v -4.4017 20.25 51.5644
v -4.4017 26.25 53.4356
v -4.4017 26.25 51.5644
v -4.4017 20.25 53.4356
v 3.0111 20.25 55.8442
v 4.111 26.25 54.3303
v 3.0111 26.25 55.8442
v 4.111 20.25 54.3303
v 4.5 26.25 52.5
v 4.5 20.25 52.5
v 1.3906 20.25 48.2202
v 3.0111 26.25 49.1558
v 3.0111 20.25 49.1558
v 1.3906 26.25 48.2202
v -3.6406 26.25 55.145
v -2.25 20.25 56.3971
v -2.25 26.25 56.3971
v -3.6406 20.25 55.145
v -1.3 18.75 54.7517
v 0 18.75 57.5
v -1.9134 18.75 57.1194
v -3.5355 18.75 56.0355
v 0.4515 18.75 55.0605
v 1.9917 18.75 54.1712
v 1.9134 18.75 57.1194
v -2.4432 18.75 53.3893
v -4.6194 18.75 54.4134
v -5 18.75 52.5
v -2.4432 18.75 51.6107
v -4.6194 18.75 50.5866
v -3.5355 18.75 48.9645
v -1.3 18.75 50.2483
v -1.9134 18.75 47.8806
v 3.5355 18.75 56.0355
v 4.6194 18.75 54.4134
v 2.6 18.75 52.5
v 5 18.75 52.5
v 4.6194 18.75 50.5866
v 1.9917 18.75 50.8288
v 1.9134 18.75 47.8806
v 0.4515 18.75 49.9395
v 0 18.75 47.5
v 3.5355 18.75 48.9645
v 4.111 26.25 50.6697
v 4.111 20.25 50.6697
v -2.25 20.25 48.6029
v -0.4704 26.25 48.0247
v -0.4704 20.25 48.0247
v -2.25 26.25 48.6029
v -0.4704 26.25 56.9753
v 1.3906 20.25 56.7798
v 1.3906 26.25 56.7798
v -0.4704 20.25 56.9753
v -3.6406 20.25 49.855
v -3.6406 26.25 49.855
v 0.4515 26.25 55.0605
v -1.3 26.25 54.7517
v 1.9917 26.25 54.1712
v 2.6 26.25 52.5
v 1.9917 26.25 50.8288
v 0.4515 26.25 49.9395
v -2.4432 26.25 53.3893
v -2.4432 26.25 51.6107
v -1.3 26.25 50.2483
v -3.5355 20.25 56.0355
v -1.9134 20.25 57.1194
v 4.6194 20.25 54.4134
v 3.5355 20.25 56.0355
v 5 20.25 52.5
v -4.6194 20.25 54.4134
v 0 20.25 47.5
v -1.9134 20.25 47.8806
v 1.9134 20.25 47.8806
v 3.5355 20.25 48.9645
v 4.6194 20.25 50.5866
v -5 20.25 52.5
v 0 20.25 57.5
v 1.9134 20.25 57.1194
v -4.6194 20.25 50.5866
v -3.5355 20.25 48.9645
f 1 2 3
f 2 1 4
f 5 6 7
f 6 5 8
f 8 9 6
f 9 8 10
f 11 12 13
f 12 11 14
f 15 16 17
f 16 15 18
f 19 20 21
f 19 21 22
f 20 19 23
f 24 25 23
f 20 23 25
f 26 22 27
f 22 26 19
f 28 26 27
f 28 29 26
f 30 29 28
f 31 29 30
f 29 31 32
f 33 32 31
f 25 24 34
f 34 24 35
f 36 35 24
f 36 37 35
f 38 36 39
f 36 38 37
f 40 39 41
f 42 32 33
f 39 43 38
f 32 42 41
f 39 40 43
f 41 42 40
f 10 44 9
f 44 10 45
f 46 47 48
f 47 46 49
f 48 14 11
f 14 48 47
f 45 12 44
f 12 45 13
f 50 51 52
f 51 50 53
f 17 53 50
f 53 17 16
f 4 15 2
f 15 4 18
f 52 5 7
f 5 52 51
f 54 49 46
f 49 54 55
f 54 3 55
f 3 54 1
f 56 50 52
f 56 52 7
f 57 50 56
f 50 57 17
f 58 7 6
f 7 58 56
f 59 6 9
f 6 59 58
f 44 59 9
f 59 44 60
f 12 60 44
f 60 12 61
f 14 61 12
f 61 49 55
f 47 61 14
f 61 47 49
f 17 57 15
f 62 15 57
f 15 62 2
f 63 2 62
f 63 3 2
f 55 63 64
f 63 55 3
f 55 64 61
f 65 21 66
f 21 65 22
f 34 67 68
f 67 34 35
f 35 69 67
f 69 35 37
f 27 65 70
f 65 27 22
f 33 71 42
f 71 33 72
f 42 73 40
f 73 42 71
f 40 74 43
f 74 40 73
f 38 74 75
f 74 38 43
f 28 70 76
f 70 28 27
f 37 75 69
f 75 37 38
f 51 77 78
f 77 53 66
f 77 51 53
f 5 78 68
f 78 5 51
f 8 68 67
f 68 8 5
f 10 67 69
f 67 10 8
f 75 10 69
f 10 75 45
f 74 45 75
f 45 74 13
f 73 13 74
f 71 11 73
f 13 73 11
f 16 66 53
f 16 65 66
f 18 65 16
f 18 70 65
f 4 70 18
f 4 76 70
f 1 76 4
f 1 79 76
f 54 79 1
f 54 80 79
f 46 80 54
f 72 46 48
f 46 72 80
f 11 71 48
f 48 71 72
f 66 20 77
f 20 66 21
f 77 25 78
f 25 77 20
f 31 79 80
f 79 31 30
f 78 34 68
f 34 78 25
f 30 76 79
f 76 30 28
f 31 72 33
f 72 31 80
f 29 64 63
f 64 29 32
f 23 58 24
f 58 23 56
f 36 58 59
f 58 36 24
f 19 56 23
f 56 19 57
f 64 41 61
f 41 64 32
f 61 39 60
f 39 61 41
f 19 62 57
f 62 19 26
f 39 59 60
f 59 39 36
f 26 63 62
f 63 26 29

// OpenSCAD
// file: Addons_v1.scad
include <Defines_v1.scad>;

module Folie() {
    translate([45, - height / 2 - 3, depth - 50])
        rotate([90,-90,0])
            cube([80,70,1.5], center = true);
}

module Board() {
    translate([52.5, height / 2 - 5, depth / 2 - 5])
    rotate([90,0,0])
    difference() {
        union() {
            cube([63, 52, 1.6], center = true);
            cube([80, 34, 1.6], center = true);
            cube([73, 44, 1.6], center = true);
            
            translate([-35.56, -8.89, 3])
                cube([2.54, 10.16, 10], center = true);
            
            translate([-7.7, -23.24, 3])
                cube([17.78, 2.54, 10], center = true);
            
            translate([12.78, -23.24, 3])
                cube([7.62, 2.54, 10], center = true);
            
            translate([21.59, -12.7, 7])
                cube([20.32, 2.54, 18], center = true);
            translate([21.59, 15.24, 7])
                cube([20.32, 2.54, 18], center = true);            
            translate([24.13, 1.27, 14])
                cube([27.94, 31.75, 1.6], center = true);
            
        }
        
        for (i = [-1: 2: 1]) for (j = [-1: 2: 1])
        {
            translate([i*21, j*21, 0])
                cylinder(2, 1.75, 1.75, $fn=16, center = true);
            translate([i*36.5, j*22, 0])
                cylinder(2, 5, 5, $fn=16, center = true);
        }
        
        cols = [9, 9, 9, 9, 9, 9, 9, 9, 7, 7, 7, 7, 7, 6, 5];
        for (row = [-14 : 1 : 14])
        { 
            for (col = [-cols[abs(row)], -cols[abs(row)] + 1,
                        cols[abs(row)] - 1, cols[abs(row)]]) 
            {
                translate([2.54 * row, 2.54 * col, 0])
                    cube([0.8, 0.8, 2], center = true);
            }
        }
    }
}

Board();

module BatPack() {
    translate([-55, height / 2 - 11, depth / 2])
    rotate([0,0,90]) {
        translate([0, 0, 0]) 
            cylinder(65, 9, 9, center = true);
        translate([0, 19, 0]) 
            cylinder(65, 9, 9, center = true);
        translate([0, 38, 0]) 
            cylinder(65, 9, 9, center = true);
        translate([0, -19, 0]) 
            cylinder(65, 9, 9, center = true);
        translate([0, -38, 0]) 
            cylinder(65, 9, 9, center = true);
    }
}

module Lader() {
    translate([-30, 7 - height / 2 , depth/2 + 20])
    rotate([-90, 0, 0])
    union() {
        translate([0, 0, 0]) 
            cube([77, 19, 11], center = true);
        translate([32, 18, 0]) 
            cube([13, 55, 11], center = true);
        translate([0, 5, -2]) 
            cube([19, 8, 11], center = true);
    }
}

module OLED() {
    translate([-40, 1 - height / 2 , depth/2 - 5])
    rotate([90,0,0])
    union() {
        translate([0, 0, 1]) 
            cube([26, 11, 3.5], center = true);
        translate([0, -1, 0]) 
            cube([39, 13, 1.5], center = true);
        translate([17, -1, -3]) 
            cube([3, 11, 12], center = true);
    }
}
    
module CamMount() {
    translate([0, height / 2 - 1, depth / 2])
    rotate([90,0,0]) difference() {
        union() {
            translate([0, 0, 0]) 
                cylinder(7.5, 4.5, 4.5, center = true);
            translate([0, 0, 3]) 
                cylinder(1.5, 5, 5, center = true);
        }
        translate([0, 0, 0]) 
            cylinder(8, 2.6, 2.6, center = true);
    }
}

Board();
// file: Fuss_v1.scad
include <Defines_v1.scad>;

module Fuss() {
    difference() {
        translate([0,0,5.5]) minkowski() {
            difference() {
                cylinder(10, 8, 8, $fn = grade, center = true);
                translate([0,0,5])
                    cylinder(5, 7.5, 7.5, $fn = grade, center = true);
            }
            sphere(2, $fn=8);
        }
        translate([0,0,-1.5]) 
            cube([20,20,3], center = true);
        translate([0, 0, 5]) 
            cylinder(10.1, 1, 1, $fn = 16, center = true);
        translate([0, 0, 9.5]) 
            cylinder(1, 1, 3, $fn = 16, center = true);
    }
}

translate([-20,-20,0]) Fuss();
translate([20,-20,0]) Fuss();
translate([-20,20,0]) Fuss();
translate([20,20,0]) Fuss();
// file: Stativ_v1.scad
include <Defines_v1.scad>;

module Stativ() {
    difference() {
        union() {
            hull() {
                translate([0, stand, 0]) cylinder(5, 5, 5, $fn=48);
                cylinder(5, 10, 10, $fn=48);
            }
            cylinder(20, 8, 8, $fn=48);
        }
        translate([0, -10, 15.1]) cube([20, 20, 5]);
        translate([-3.5, 0, 15.1]) 
            cylinder(10.1, 1, 1, $fn=16, center = true);
    }
}

module Scheibe() {
    difference() {
        cylinder(5, 10, 10, $fn=48);
        translate([-3.5, 0, 0.1]) 
            cylinder(10.1, 1, 1, $fn=16, center = true);
        translate([-3.5, 0, 4]) 
            cylinder(2.1, 1, 3, $fn=16, center = true);        
    }
}

Stativ();
translate([30,0,0]) Scheibe();
// file: Decke_v1.scad
include <Defines_v1.scad>;

bwidth = width + 14;
bheight = depth + 7;

module hole() {
    union() {
        translate([0, 0, 3.5]) cylinder(7.1, 1, 1, $fn=16, center = true);
        translate([0, 0, 0.7]) cylinder(1.5, 4, 1, $fn=16, center = true);
    }
}

module Decke() {
    difference() {
        union() {
            translate([bwidth / 2, bheight / 2, 2.5]) 
                cube([bwidth, bheight, 5], center = true);
            translate([16.5, 16, 3.5]) 
                cube([13, 13, 7], center = true);
            translate([bwidth-16.5, 16, 3.5]) 
                cube([13, 13, 7], center = true);
            translate([16.5, bheight-16, 3.5]) 
                cube([13, 13, 7], center = true);
            translate([bwidth-16.5, bheight-16, 3.5]) 
                cube([13, 13, 7], center = true);
        }
        
        translate([bwidth - 6.5, bheight / 2, 5]) 
            cube([7, depth + 2, 4.1], center = true);

        translate([6.5, bheight / 2, 5]) 
            cube([7, depth + 2, 4.1], center = true);

        translate([bwidth / 2, 7.5, 5]) 
            cube([width, 4, 4.1], center = true);

        translate([bwidth / 2, bheight - 7.5, 5]) 
            cube([width, 4, 4.1], center = true);

        translate([bwidth / 2, bheight / 2, 5]) 
            cube([width - 12, depth - 38, 4.1], center = true);

        translate([bwidth / 2, bheight / 2, 5]) 
            cube([width - 32, depth - 18, 4.1], center = true);

        translate([16.5, 16.5, 0]) hole();
        translate([bwidth - 16.5, 16.5, 0]) hole();
        translate([16.5, bheight - 16.5, 0]) hole();
        translate([bwidth - 16.5, bheight - 16.5, 0]) hole();

        if (minimal != 1) {
            // OLED hole
            translate([71, bheight / 2 + 5 , 0])
            { 
                translate([6, 0 , 2.5]) 
                    cube([26, 11, 5.1], center = true);
                translate([7, -1 , 3]) 
                    cube([39, 13, 4.1], center = true);
            }
            
            // pin header hole
            translate([bwidth / 2 + 45, bheight - 20 , 2.5]) 
                cube([19, 3, 5.1], center = true);
            
            // loader LED thinning hole
            translate([bwidth / 2 - 30, bheight / 2 - 15, 2.5]) 
                cube([19, 8, 4], center = true);
        }
    }
}

Decke();
// file: Boden_v1.scad
include <Defines_v1.scad>;

module hole() {
    union() {
        translate([0, 0, 3.5]) cylinder(7.1, 1, 1, $fn=16, center = true);
        translate([0, 0, 0.7]) cylinder(1.5, 1.5, 1, $fn=16, center = true);
    }
}

module Boden() {
    difference() {
        union() {
            difference() {
                union() {
                    //translate([bwidth / 2, bheight / 2, 2.5]) 
                    //    cube([bwidth, bheight, 5], center = true);
                    translate([16.5, 16, 3.5]) 
                        cube([13, 13, 7], center = true);
                    translate([bwidth-16.5, 16, 3.5]) 
                        cube([13, 13, 7], center = true);
                    translate([16.5, bheight-16, 3.5]) 
                        cube([13, 13, 7], center = true);
                    translate([bwidth-16.5, bheight-16, 3.5]) 
                        cube([13, 13, 7], center = true);
                }

                translate([bwidth - 6.5, bheight / 2, 4]) 
                    cube([7, depth + 2, 2.1], center = true);

                translate([6.5, bheight / 2, 4]) 
                    cube([7, depth + 2, 2.1], center = true);

                translate([bwidth / 2, 7.5, 4]) 
                    cube([width, 4, 2.1], center = true);

                translate([bwidth / 2, bheight - 7.5, 4]) 
                    cube([width, 4, 2.1], center = true);

                translate([bwidth / 2, bheight / 2, 4]) 
                    cube([width - 12, depth - 38, 2.1], center = true);

                translate([bwidth / 2, bheight / 2, 4]) 
                    cube([width - 32, depth - 18, 2.1], center = true);

                translate([16.5, 16.5, 0]) hole();
                translate([bwidth - 16.5, 16.5, 0]) hole();
                translate([16.5, bheight - 16.5, 0]) hole();
                translate([bwidth - 16.5, bheight - 16.5, 0]) hole();
            }

            translate([bwidth / 2 + usb_offs, bheight - 17, 4])
                cube([30, 10, 2.1], center = true);

            translate([bwidth / 2, bheight / 2, 4])
                cube([20, 20, 3.1], center = true);
            
            translate([bwidth / 2 + 50, bheight / 2 - 15, 4])
            {
                translate([21, 21, 0])
                    cube([8, 8, 4], center = true);
                translate([-21, 21, 0])
                    cube([8, 8, 4], center = true);
                translate([21, -21, 0])
                    cube([8, 8, 4], center = true);
                translate([-21, -21, 0])
                    cube([8, 8, 4], center = true);
            }
        }
        translate([bwidth / 2, bheight / 2, 4]) 
            cylinder(10, 4.5, 4.5, center = true);
    }
}

Boden();
// file: Seite_rechts_v1.scad
include <Defines_v1.scad>;

module Rechts() {
    union() {
        difference() {
            translate([depth / 2, height / 2, 2.5]) 
                cube([depth, height, 5], center = true);
            translate([depth / 2, height / 2, 4.5]) 
                cube([depth - 16, height - 4, 4], center = true);
            translate([depth / 2, height / 2, 4.5]) 
                cube([depth - 5, 24, 4], center = true);
            translate([4, height / 2, 4.5]) 
                cube([3.5, height + 0.1, 4], center = true);
            translate([depth - 4, height / 2, 4.5]) 
                cube([3.5, height + 0.1, 4], center = true);
            translate([30, height / 2, 4]) 
                cylinder(8.1, 9, 9, $fn=48, center = true);
        }
        translate([24, height / 2 - 2.7, 4]) rotate([0, 0, 25])
             cylinder(8, 6, 6, $fn = 3, center = true);
        translate([30, height / 2, 4]) 
            difference() {
                cylinder(8, 12, 12, $fn=48, center = true);
                cylinder(8.1, 9, 9, $fn=48, center = true);
            }            
    }
}

Rechts();
// file: Seite_links_v1.scad
include <Defines_v1.scad>;

module Links() {
    union() {
        difference() {
            translate([depth / 2, height / 2, 2.5]) 
                cube([depth, height, 5], center = true);
            translate([depth / 2, height / 2, 4.5]) 
                cube([depth - 16, height - 4, 4], center = true);
            translate([depth / 2, height / 2, 4.5]) 
                cube([depth - 5, 24, 4], center = true);
            translate([4, height / 2, 4.5]) 
                cube([3.5, height + 0.1, 4], center = true);
            translate([depth - 4, height / 2, 4.5]) 
                cube([3.5, height + 0.1, 4], center = true);
            translate([30, height / 2, 4]) 
                cylinder(8.1, 9, 9, $fn=48, center = true);
        }
        translate([36, height / 2 - 2.7, 4]) rotate([0, 0, 35])
             cylinder(8, 6, 6, $fn = 3, center = true);
        translate([30, height / 2, 4]) 
            difference() {
                cylinder(8, 12, 12, $fn=48, center = true);
                cylinder(8.1, 9, 9, $fn=48, center = true);
            }            
    }
}

Links();
// file: Hinten_v1.scad
include <Defines_v1.scad>;

module Hinten() {
    union() {
        difference() {
            translate([width / 2, height / 2, 2.5]) 
                cube([width, height, 5], center = true);
            
            translate([0, 0, 4.5]) {
                translate([width / 2, height / 2, 0]) 
                    cube([width + 0.1, height - 12, 3], center = true);
                translate([width / 2, height, 0]) 
                    cube([width + 0.1, 6, 3], center = true);
                translate([width / 2, 0, 0]) 
                    cube([width + 0.1, 6, 3], center = true);
                translate([10, height / 2, 0]) 
                    cube([20.1, height + 0.1, 3], center = true);
                translate([width - 10, height / 2, 0]) 
                    cube([20.1, height + 0.1, 3], center = true);
            }
            translate([width / 2 + usb_offs, 13, 0.6]) 
                cube([12, 12, 5], center = true);    
        
            translate([width / 2 + 30, 20, 0.6]) 
                cylinder(5, 5, 5, $fn=48, center = true);
        }
        translate([width / 2 + usb_offs - 11, 6, 9]) 
            cube([10, 6, 12], center = true);        
        translate([width / 2 + usb_offs + 11, 6, 9]) 
            cube([10, 6, 12], center = true);        
    }
}

Hinten();
// file: Blende_v1.scad
include <Defines_v1.scad>;
use <Diffusor_v1.scad>;

module LED_hole() {
    union() {
        cube([led, led, 5], center = true);
        cube([led+1.1, led+1.1, 0.6], center = true);
    }
}

module Blende() {
    difference() {
        translate([width / 2, height / 2, -thick / 2]) 
            cube([width, height, thick], center = true);
        
        translate([0, 0, 0]) {
            translate([width / 2, height / 2, 0]) 
                cube([width + 0.1, height - 10, thick - 1], center = true);
            translate([width / 2, height, 0]) 
                cube([width + 0.1, 6, thick - 1], center = true);
            translate([width / 2, 0, 0]) 
                cube([width + 0.1, 6, thick - 1], center = true);
            translate([10, height / 2, 0]) 
                cube([20.1, height + 0.1, thick - 1], center = true);
            translate([width - 10, height / 2, 0]) 
                cube([20.1, height + 0.1, thick - 1], center = true);
        }
        
        translate([0, 0, -3]) {
            translate([width / 2, height, 0]) 
                cube([width + 0.1, 6, thick - 1], center = true);
            translate([width / 2, 0, 0]) 
                cube([width + 0.1, 6, thick - 1], center = true);
            translate([2, height / 2, 0]) 
                cube([6, height + 0.1, thick - 1], center = true);
            translate([width - 2, height / 2, 0]) 
                cube([6, height + 0.1, thick - 1], center = true);
        }        
        
        translate([0, 0, -thick / 2 + 1.6]) {
            translate([width / 2, height / 2 - 7, 0]) 
                cube([width - margin - 4, 11.5, thick - 1], center = true);
            translate([width/2, height / 2 + 7, 0]) 
                cube([width - margin - 4, 11.5, thick - 1], center = true);
        }
        
        translate([margin, 0, -9.0]) {        
            for (a = [ 0 : 1 : 14 ])
                translate([(a + 0.5) * (5 + space) + 5, height / 2 - 7, 0]) 
                    LED_hole();
            for (a = [ 0 : 1 : 14 ])
                translate([(a + 0.5) * (5 + space) + 5, height / 2 + 7, 0]) 
                    LED_hole();
        }   
    }
}

%Diffusor();
Blende();
// file: Diffusor_v1.scad
include <Defines_v1.scad>;

module LED() {
    union() {
        cube([led, led, 2], center = true);
        cube([led+1, led+1, 0.5], center = true);
    }
}

module Diffusor() {
    translate([margin, 0, -thick + 1.1]) {        
            for (a = [ 0 : 1 : 14 ])
                translate([(a + 0.5) * (5 + space) + 5, height / 2 - 7, 0]) 
                    LED();
                    
            for (a = [ 0 : 1 : 14 ])
                translate([(a + 0.5) * (5 + space) + 5, height / 2 + 7, 0]) 
                    LED();
        }        
}

Diffusor();
// file: Defines_v1.scad
/* spacing between the leds
 * usually around 12, can be forced
 * to 6-10 by bending strip
 */
space = 6;  

/* some space for the outermost leds
 * for better viewing angle
 */
margin = 10;

/* 15 leds (type 5050) with above spacing */
width = 15 * (5 + space) + 10 + 2 * margin;

/* box height, min. 42mm */
height = 47;

/* box depth, min 100mm for 4x3-keypad */
depth = 105;

/* max wall thickness */
thick=10;

/* grade of feet smoothness
 * below 10 looks bad
 * 10-16 is reasonable
 * above 16 takes much time to render
 */
grade = 12;

/* length of side stands 
 * should be enough to get box in right angle
 * should not exceed back of box
 */
stand = min(height + 20, depth - 40);

/* offset of usb plug from center */
usb_offs = 60;

/* calculated values */
bwidth = width + 14;
bheight = depth + 7;

/* size of led holes 
 * includes some margin for 5050 leds
 */
led = 5.75;

minimal = 1;
// main file
include <Defines_v1.scad>;
use <Diffusor_v1.scad>;
use <Blende_v1.scad>;
use <Hinten_v1.scad>;
use <Seite_links_v1.scad>;
use <Seite_rechts_v1.scad>;
use <Boden_v1.scad>;
use <Decke_v1.scad>;
use <Stativ_v1.scad>;
use <Fuss_v1.scad>;
use <Addons_v1.scad>;

echo(str("Sizes are ", width, "x", height, "x", depth));
echo(str("Base plate is ", bwidth, "x", bheight));

%translate([-width / 2, -height / 2, 12.5]) {
    Diffusor();
}

module Box() {
    translate([-width / 2, -height / 2, 12.5]) {
        Blende();
    }

    translate([-width / 2, height / 2, depth - 2.5]) {
        rotate([0, 180, 180]) {
            Hinten();
        }
    }

    translate([width / 2 + 3, -height / 2, 0]) {
        rotate([0, -90, 0]) {
            Links();
        }
    }

    translate([-width / 2 - 3, height / 2, 0]) {
        rotate([0, -90, 180]) {
            Rechts();
        }
    }

    translate([-width / 2 - 7, height / 2 + 2.5, -3.5]) {
        rotate([90, 0, 0]) {
            Boden();
        }
    }

    translate([-width / 2 - 7, -height / 2 - 2.5, depth + 3.5]) {
        rotate([-90, 0, 0]) {
            Decke();
        }
    }
}

module Stand() {
        translate([-width / 2 - 14, 0, 30]) {
        rotate([90, 5 + $t * 120, 90]) {
            Stativ();
            translate([0,0,21]) Scheibe();
        }
    }

    translate([width / 2 + 14, 0, 30]) {
        rotate([90, -5 - $t * 120, -90]) {
            Stativ();
            translate([0,0,21]) Scheibe();
        }
    }
}

module Fuesse() {
    translate([width / 2 - 10, height / 2 + 0.5, 13]) {
        rotate([90, 0, 180]) {
            Fuss();
        }
    }
    translate([- width / 2 + 10, height / 2 + 0.5, 13]) {
        rotate([90, 0, 180]) {
            Fuss();
        }
    }
    translate([width / 2 - 10, height / 2 + 0.5, depth - 13]) {
        rotate([90, 0, 180]) {
            Fuss();
        }
    }
    translate([- width / 2 + 10, height / 2 + 0.5, depth - 13]) {
        rotate([90, 0, 180]) {
            Fuss();
        }
    }
}
module Addons() {
    //Folie();
    //Board();
    //BatPack();
    //OLED();
    //Lader();
    CamMount();
}

%Box();
%Stand();
%Fuesse();
#Addons();
